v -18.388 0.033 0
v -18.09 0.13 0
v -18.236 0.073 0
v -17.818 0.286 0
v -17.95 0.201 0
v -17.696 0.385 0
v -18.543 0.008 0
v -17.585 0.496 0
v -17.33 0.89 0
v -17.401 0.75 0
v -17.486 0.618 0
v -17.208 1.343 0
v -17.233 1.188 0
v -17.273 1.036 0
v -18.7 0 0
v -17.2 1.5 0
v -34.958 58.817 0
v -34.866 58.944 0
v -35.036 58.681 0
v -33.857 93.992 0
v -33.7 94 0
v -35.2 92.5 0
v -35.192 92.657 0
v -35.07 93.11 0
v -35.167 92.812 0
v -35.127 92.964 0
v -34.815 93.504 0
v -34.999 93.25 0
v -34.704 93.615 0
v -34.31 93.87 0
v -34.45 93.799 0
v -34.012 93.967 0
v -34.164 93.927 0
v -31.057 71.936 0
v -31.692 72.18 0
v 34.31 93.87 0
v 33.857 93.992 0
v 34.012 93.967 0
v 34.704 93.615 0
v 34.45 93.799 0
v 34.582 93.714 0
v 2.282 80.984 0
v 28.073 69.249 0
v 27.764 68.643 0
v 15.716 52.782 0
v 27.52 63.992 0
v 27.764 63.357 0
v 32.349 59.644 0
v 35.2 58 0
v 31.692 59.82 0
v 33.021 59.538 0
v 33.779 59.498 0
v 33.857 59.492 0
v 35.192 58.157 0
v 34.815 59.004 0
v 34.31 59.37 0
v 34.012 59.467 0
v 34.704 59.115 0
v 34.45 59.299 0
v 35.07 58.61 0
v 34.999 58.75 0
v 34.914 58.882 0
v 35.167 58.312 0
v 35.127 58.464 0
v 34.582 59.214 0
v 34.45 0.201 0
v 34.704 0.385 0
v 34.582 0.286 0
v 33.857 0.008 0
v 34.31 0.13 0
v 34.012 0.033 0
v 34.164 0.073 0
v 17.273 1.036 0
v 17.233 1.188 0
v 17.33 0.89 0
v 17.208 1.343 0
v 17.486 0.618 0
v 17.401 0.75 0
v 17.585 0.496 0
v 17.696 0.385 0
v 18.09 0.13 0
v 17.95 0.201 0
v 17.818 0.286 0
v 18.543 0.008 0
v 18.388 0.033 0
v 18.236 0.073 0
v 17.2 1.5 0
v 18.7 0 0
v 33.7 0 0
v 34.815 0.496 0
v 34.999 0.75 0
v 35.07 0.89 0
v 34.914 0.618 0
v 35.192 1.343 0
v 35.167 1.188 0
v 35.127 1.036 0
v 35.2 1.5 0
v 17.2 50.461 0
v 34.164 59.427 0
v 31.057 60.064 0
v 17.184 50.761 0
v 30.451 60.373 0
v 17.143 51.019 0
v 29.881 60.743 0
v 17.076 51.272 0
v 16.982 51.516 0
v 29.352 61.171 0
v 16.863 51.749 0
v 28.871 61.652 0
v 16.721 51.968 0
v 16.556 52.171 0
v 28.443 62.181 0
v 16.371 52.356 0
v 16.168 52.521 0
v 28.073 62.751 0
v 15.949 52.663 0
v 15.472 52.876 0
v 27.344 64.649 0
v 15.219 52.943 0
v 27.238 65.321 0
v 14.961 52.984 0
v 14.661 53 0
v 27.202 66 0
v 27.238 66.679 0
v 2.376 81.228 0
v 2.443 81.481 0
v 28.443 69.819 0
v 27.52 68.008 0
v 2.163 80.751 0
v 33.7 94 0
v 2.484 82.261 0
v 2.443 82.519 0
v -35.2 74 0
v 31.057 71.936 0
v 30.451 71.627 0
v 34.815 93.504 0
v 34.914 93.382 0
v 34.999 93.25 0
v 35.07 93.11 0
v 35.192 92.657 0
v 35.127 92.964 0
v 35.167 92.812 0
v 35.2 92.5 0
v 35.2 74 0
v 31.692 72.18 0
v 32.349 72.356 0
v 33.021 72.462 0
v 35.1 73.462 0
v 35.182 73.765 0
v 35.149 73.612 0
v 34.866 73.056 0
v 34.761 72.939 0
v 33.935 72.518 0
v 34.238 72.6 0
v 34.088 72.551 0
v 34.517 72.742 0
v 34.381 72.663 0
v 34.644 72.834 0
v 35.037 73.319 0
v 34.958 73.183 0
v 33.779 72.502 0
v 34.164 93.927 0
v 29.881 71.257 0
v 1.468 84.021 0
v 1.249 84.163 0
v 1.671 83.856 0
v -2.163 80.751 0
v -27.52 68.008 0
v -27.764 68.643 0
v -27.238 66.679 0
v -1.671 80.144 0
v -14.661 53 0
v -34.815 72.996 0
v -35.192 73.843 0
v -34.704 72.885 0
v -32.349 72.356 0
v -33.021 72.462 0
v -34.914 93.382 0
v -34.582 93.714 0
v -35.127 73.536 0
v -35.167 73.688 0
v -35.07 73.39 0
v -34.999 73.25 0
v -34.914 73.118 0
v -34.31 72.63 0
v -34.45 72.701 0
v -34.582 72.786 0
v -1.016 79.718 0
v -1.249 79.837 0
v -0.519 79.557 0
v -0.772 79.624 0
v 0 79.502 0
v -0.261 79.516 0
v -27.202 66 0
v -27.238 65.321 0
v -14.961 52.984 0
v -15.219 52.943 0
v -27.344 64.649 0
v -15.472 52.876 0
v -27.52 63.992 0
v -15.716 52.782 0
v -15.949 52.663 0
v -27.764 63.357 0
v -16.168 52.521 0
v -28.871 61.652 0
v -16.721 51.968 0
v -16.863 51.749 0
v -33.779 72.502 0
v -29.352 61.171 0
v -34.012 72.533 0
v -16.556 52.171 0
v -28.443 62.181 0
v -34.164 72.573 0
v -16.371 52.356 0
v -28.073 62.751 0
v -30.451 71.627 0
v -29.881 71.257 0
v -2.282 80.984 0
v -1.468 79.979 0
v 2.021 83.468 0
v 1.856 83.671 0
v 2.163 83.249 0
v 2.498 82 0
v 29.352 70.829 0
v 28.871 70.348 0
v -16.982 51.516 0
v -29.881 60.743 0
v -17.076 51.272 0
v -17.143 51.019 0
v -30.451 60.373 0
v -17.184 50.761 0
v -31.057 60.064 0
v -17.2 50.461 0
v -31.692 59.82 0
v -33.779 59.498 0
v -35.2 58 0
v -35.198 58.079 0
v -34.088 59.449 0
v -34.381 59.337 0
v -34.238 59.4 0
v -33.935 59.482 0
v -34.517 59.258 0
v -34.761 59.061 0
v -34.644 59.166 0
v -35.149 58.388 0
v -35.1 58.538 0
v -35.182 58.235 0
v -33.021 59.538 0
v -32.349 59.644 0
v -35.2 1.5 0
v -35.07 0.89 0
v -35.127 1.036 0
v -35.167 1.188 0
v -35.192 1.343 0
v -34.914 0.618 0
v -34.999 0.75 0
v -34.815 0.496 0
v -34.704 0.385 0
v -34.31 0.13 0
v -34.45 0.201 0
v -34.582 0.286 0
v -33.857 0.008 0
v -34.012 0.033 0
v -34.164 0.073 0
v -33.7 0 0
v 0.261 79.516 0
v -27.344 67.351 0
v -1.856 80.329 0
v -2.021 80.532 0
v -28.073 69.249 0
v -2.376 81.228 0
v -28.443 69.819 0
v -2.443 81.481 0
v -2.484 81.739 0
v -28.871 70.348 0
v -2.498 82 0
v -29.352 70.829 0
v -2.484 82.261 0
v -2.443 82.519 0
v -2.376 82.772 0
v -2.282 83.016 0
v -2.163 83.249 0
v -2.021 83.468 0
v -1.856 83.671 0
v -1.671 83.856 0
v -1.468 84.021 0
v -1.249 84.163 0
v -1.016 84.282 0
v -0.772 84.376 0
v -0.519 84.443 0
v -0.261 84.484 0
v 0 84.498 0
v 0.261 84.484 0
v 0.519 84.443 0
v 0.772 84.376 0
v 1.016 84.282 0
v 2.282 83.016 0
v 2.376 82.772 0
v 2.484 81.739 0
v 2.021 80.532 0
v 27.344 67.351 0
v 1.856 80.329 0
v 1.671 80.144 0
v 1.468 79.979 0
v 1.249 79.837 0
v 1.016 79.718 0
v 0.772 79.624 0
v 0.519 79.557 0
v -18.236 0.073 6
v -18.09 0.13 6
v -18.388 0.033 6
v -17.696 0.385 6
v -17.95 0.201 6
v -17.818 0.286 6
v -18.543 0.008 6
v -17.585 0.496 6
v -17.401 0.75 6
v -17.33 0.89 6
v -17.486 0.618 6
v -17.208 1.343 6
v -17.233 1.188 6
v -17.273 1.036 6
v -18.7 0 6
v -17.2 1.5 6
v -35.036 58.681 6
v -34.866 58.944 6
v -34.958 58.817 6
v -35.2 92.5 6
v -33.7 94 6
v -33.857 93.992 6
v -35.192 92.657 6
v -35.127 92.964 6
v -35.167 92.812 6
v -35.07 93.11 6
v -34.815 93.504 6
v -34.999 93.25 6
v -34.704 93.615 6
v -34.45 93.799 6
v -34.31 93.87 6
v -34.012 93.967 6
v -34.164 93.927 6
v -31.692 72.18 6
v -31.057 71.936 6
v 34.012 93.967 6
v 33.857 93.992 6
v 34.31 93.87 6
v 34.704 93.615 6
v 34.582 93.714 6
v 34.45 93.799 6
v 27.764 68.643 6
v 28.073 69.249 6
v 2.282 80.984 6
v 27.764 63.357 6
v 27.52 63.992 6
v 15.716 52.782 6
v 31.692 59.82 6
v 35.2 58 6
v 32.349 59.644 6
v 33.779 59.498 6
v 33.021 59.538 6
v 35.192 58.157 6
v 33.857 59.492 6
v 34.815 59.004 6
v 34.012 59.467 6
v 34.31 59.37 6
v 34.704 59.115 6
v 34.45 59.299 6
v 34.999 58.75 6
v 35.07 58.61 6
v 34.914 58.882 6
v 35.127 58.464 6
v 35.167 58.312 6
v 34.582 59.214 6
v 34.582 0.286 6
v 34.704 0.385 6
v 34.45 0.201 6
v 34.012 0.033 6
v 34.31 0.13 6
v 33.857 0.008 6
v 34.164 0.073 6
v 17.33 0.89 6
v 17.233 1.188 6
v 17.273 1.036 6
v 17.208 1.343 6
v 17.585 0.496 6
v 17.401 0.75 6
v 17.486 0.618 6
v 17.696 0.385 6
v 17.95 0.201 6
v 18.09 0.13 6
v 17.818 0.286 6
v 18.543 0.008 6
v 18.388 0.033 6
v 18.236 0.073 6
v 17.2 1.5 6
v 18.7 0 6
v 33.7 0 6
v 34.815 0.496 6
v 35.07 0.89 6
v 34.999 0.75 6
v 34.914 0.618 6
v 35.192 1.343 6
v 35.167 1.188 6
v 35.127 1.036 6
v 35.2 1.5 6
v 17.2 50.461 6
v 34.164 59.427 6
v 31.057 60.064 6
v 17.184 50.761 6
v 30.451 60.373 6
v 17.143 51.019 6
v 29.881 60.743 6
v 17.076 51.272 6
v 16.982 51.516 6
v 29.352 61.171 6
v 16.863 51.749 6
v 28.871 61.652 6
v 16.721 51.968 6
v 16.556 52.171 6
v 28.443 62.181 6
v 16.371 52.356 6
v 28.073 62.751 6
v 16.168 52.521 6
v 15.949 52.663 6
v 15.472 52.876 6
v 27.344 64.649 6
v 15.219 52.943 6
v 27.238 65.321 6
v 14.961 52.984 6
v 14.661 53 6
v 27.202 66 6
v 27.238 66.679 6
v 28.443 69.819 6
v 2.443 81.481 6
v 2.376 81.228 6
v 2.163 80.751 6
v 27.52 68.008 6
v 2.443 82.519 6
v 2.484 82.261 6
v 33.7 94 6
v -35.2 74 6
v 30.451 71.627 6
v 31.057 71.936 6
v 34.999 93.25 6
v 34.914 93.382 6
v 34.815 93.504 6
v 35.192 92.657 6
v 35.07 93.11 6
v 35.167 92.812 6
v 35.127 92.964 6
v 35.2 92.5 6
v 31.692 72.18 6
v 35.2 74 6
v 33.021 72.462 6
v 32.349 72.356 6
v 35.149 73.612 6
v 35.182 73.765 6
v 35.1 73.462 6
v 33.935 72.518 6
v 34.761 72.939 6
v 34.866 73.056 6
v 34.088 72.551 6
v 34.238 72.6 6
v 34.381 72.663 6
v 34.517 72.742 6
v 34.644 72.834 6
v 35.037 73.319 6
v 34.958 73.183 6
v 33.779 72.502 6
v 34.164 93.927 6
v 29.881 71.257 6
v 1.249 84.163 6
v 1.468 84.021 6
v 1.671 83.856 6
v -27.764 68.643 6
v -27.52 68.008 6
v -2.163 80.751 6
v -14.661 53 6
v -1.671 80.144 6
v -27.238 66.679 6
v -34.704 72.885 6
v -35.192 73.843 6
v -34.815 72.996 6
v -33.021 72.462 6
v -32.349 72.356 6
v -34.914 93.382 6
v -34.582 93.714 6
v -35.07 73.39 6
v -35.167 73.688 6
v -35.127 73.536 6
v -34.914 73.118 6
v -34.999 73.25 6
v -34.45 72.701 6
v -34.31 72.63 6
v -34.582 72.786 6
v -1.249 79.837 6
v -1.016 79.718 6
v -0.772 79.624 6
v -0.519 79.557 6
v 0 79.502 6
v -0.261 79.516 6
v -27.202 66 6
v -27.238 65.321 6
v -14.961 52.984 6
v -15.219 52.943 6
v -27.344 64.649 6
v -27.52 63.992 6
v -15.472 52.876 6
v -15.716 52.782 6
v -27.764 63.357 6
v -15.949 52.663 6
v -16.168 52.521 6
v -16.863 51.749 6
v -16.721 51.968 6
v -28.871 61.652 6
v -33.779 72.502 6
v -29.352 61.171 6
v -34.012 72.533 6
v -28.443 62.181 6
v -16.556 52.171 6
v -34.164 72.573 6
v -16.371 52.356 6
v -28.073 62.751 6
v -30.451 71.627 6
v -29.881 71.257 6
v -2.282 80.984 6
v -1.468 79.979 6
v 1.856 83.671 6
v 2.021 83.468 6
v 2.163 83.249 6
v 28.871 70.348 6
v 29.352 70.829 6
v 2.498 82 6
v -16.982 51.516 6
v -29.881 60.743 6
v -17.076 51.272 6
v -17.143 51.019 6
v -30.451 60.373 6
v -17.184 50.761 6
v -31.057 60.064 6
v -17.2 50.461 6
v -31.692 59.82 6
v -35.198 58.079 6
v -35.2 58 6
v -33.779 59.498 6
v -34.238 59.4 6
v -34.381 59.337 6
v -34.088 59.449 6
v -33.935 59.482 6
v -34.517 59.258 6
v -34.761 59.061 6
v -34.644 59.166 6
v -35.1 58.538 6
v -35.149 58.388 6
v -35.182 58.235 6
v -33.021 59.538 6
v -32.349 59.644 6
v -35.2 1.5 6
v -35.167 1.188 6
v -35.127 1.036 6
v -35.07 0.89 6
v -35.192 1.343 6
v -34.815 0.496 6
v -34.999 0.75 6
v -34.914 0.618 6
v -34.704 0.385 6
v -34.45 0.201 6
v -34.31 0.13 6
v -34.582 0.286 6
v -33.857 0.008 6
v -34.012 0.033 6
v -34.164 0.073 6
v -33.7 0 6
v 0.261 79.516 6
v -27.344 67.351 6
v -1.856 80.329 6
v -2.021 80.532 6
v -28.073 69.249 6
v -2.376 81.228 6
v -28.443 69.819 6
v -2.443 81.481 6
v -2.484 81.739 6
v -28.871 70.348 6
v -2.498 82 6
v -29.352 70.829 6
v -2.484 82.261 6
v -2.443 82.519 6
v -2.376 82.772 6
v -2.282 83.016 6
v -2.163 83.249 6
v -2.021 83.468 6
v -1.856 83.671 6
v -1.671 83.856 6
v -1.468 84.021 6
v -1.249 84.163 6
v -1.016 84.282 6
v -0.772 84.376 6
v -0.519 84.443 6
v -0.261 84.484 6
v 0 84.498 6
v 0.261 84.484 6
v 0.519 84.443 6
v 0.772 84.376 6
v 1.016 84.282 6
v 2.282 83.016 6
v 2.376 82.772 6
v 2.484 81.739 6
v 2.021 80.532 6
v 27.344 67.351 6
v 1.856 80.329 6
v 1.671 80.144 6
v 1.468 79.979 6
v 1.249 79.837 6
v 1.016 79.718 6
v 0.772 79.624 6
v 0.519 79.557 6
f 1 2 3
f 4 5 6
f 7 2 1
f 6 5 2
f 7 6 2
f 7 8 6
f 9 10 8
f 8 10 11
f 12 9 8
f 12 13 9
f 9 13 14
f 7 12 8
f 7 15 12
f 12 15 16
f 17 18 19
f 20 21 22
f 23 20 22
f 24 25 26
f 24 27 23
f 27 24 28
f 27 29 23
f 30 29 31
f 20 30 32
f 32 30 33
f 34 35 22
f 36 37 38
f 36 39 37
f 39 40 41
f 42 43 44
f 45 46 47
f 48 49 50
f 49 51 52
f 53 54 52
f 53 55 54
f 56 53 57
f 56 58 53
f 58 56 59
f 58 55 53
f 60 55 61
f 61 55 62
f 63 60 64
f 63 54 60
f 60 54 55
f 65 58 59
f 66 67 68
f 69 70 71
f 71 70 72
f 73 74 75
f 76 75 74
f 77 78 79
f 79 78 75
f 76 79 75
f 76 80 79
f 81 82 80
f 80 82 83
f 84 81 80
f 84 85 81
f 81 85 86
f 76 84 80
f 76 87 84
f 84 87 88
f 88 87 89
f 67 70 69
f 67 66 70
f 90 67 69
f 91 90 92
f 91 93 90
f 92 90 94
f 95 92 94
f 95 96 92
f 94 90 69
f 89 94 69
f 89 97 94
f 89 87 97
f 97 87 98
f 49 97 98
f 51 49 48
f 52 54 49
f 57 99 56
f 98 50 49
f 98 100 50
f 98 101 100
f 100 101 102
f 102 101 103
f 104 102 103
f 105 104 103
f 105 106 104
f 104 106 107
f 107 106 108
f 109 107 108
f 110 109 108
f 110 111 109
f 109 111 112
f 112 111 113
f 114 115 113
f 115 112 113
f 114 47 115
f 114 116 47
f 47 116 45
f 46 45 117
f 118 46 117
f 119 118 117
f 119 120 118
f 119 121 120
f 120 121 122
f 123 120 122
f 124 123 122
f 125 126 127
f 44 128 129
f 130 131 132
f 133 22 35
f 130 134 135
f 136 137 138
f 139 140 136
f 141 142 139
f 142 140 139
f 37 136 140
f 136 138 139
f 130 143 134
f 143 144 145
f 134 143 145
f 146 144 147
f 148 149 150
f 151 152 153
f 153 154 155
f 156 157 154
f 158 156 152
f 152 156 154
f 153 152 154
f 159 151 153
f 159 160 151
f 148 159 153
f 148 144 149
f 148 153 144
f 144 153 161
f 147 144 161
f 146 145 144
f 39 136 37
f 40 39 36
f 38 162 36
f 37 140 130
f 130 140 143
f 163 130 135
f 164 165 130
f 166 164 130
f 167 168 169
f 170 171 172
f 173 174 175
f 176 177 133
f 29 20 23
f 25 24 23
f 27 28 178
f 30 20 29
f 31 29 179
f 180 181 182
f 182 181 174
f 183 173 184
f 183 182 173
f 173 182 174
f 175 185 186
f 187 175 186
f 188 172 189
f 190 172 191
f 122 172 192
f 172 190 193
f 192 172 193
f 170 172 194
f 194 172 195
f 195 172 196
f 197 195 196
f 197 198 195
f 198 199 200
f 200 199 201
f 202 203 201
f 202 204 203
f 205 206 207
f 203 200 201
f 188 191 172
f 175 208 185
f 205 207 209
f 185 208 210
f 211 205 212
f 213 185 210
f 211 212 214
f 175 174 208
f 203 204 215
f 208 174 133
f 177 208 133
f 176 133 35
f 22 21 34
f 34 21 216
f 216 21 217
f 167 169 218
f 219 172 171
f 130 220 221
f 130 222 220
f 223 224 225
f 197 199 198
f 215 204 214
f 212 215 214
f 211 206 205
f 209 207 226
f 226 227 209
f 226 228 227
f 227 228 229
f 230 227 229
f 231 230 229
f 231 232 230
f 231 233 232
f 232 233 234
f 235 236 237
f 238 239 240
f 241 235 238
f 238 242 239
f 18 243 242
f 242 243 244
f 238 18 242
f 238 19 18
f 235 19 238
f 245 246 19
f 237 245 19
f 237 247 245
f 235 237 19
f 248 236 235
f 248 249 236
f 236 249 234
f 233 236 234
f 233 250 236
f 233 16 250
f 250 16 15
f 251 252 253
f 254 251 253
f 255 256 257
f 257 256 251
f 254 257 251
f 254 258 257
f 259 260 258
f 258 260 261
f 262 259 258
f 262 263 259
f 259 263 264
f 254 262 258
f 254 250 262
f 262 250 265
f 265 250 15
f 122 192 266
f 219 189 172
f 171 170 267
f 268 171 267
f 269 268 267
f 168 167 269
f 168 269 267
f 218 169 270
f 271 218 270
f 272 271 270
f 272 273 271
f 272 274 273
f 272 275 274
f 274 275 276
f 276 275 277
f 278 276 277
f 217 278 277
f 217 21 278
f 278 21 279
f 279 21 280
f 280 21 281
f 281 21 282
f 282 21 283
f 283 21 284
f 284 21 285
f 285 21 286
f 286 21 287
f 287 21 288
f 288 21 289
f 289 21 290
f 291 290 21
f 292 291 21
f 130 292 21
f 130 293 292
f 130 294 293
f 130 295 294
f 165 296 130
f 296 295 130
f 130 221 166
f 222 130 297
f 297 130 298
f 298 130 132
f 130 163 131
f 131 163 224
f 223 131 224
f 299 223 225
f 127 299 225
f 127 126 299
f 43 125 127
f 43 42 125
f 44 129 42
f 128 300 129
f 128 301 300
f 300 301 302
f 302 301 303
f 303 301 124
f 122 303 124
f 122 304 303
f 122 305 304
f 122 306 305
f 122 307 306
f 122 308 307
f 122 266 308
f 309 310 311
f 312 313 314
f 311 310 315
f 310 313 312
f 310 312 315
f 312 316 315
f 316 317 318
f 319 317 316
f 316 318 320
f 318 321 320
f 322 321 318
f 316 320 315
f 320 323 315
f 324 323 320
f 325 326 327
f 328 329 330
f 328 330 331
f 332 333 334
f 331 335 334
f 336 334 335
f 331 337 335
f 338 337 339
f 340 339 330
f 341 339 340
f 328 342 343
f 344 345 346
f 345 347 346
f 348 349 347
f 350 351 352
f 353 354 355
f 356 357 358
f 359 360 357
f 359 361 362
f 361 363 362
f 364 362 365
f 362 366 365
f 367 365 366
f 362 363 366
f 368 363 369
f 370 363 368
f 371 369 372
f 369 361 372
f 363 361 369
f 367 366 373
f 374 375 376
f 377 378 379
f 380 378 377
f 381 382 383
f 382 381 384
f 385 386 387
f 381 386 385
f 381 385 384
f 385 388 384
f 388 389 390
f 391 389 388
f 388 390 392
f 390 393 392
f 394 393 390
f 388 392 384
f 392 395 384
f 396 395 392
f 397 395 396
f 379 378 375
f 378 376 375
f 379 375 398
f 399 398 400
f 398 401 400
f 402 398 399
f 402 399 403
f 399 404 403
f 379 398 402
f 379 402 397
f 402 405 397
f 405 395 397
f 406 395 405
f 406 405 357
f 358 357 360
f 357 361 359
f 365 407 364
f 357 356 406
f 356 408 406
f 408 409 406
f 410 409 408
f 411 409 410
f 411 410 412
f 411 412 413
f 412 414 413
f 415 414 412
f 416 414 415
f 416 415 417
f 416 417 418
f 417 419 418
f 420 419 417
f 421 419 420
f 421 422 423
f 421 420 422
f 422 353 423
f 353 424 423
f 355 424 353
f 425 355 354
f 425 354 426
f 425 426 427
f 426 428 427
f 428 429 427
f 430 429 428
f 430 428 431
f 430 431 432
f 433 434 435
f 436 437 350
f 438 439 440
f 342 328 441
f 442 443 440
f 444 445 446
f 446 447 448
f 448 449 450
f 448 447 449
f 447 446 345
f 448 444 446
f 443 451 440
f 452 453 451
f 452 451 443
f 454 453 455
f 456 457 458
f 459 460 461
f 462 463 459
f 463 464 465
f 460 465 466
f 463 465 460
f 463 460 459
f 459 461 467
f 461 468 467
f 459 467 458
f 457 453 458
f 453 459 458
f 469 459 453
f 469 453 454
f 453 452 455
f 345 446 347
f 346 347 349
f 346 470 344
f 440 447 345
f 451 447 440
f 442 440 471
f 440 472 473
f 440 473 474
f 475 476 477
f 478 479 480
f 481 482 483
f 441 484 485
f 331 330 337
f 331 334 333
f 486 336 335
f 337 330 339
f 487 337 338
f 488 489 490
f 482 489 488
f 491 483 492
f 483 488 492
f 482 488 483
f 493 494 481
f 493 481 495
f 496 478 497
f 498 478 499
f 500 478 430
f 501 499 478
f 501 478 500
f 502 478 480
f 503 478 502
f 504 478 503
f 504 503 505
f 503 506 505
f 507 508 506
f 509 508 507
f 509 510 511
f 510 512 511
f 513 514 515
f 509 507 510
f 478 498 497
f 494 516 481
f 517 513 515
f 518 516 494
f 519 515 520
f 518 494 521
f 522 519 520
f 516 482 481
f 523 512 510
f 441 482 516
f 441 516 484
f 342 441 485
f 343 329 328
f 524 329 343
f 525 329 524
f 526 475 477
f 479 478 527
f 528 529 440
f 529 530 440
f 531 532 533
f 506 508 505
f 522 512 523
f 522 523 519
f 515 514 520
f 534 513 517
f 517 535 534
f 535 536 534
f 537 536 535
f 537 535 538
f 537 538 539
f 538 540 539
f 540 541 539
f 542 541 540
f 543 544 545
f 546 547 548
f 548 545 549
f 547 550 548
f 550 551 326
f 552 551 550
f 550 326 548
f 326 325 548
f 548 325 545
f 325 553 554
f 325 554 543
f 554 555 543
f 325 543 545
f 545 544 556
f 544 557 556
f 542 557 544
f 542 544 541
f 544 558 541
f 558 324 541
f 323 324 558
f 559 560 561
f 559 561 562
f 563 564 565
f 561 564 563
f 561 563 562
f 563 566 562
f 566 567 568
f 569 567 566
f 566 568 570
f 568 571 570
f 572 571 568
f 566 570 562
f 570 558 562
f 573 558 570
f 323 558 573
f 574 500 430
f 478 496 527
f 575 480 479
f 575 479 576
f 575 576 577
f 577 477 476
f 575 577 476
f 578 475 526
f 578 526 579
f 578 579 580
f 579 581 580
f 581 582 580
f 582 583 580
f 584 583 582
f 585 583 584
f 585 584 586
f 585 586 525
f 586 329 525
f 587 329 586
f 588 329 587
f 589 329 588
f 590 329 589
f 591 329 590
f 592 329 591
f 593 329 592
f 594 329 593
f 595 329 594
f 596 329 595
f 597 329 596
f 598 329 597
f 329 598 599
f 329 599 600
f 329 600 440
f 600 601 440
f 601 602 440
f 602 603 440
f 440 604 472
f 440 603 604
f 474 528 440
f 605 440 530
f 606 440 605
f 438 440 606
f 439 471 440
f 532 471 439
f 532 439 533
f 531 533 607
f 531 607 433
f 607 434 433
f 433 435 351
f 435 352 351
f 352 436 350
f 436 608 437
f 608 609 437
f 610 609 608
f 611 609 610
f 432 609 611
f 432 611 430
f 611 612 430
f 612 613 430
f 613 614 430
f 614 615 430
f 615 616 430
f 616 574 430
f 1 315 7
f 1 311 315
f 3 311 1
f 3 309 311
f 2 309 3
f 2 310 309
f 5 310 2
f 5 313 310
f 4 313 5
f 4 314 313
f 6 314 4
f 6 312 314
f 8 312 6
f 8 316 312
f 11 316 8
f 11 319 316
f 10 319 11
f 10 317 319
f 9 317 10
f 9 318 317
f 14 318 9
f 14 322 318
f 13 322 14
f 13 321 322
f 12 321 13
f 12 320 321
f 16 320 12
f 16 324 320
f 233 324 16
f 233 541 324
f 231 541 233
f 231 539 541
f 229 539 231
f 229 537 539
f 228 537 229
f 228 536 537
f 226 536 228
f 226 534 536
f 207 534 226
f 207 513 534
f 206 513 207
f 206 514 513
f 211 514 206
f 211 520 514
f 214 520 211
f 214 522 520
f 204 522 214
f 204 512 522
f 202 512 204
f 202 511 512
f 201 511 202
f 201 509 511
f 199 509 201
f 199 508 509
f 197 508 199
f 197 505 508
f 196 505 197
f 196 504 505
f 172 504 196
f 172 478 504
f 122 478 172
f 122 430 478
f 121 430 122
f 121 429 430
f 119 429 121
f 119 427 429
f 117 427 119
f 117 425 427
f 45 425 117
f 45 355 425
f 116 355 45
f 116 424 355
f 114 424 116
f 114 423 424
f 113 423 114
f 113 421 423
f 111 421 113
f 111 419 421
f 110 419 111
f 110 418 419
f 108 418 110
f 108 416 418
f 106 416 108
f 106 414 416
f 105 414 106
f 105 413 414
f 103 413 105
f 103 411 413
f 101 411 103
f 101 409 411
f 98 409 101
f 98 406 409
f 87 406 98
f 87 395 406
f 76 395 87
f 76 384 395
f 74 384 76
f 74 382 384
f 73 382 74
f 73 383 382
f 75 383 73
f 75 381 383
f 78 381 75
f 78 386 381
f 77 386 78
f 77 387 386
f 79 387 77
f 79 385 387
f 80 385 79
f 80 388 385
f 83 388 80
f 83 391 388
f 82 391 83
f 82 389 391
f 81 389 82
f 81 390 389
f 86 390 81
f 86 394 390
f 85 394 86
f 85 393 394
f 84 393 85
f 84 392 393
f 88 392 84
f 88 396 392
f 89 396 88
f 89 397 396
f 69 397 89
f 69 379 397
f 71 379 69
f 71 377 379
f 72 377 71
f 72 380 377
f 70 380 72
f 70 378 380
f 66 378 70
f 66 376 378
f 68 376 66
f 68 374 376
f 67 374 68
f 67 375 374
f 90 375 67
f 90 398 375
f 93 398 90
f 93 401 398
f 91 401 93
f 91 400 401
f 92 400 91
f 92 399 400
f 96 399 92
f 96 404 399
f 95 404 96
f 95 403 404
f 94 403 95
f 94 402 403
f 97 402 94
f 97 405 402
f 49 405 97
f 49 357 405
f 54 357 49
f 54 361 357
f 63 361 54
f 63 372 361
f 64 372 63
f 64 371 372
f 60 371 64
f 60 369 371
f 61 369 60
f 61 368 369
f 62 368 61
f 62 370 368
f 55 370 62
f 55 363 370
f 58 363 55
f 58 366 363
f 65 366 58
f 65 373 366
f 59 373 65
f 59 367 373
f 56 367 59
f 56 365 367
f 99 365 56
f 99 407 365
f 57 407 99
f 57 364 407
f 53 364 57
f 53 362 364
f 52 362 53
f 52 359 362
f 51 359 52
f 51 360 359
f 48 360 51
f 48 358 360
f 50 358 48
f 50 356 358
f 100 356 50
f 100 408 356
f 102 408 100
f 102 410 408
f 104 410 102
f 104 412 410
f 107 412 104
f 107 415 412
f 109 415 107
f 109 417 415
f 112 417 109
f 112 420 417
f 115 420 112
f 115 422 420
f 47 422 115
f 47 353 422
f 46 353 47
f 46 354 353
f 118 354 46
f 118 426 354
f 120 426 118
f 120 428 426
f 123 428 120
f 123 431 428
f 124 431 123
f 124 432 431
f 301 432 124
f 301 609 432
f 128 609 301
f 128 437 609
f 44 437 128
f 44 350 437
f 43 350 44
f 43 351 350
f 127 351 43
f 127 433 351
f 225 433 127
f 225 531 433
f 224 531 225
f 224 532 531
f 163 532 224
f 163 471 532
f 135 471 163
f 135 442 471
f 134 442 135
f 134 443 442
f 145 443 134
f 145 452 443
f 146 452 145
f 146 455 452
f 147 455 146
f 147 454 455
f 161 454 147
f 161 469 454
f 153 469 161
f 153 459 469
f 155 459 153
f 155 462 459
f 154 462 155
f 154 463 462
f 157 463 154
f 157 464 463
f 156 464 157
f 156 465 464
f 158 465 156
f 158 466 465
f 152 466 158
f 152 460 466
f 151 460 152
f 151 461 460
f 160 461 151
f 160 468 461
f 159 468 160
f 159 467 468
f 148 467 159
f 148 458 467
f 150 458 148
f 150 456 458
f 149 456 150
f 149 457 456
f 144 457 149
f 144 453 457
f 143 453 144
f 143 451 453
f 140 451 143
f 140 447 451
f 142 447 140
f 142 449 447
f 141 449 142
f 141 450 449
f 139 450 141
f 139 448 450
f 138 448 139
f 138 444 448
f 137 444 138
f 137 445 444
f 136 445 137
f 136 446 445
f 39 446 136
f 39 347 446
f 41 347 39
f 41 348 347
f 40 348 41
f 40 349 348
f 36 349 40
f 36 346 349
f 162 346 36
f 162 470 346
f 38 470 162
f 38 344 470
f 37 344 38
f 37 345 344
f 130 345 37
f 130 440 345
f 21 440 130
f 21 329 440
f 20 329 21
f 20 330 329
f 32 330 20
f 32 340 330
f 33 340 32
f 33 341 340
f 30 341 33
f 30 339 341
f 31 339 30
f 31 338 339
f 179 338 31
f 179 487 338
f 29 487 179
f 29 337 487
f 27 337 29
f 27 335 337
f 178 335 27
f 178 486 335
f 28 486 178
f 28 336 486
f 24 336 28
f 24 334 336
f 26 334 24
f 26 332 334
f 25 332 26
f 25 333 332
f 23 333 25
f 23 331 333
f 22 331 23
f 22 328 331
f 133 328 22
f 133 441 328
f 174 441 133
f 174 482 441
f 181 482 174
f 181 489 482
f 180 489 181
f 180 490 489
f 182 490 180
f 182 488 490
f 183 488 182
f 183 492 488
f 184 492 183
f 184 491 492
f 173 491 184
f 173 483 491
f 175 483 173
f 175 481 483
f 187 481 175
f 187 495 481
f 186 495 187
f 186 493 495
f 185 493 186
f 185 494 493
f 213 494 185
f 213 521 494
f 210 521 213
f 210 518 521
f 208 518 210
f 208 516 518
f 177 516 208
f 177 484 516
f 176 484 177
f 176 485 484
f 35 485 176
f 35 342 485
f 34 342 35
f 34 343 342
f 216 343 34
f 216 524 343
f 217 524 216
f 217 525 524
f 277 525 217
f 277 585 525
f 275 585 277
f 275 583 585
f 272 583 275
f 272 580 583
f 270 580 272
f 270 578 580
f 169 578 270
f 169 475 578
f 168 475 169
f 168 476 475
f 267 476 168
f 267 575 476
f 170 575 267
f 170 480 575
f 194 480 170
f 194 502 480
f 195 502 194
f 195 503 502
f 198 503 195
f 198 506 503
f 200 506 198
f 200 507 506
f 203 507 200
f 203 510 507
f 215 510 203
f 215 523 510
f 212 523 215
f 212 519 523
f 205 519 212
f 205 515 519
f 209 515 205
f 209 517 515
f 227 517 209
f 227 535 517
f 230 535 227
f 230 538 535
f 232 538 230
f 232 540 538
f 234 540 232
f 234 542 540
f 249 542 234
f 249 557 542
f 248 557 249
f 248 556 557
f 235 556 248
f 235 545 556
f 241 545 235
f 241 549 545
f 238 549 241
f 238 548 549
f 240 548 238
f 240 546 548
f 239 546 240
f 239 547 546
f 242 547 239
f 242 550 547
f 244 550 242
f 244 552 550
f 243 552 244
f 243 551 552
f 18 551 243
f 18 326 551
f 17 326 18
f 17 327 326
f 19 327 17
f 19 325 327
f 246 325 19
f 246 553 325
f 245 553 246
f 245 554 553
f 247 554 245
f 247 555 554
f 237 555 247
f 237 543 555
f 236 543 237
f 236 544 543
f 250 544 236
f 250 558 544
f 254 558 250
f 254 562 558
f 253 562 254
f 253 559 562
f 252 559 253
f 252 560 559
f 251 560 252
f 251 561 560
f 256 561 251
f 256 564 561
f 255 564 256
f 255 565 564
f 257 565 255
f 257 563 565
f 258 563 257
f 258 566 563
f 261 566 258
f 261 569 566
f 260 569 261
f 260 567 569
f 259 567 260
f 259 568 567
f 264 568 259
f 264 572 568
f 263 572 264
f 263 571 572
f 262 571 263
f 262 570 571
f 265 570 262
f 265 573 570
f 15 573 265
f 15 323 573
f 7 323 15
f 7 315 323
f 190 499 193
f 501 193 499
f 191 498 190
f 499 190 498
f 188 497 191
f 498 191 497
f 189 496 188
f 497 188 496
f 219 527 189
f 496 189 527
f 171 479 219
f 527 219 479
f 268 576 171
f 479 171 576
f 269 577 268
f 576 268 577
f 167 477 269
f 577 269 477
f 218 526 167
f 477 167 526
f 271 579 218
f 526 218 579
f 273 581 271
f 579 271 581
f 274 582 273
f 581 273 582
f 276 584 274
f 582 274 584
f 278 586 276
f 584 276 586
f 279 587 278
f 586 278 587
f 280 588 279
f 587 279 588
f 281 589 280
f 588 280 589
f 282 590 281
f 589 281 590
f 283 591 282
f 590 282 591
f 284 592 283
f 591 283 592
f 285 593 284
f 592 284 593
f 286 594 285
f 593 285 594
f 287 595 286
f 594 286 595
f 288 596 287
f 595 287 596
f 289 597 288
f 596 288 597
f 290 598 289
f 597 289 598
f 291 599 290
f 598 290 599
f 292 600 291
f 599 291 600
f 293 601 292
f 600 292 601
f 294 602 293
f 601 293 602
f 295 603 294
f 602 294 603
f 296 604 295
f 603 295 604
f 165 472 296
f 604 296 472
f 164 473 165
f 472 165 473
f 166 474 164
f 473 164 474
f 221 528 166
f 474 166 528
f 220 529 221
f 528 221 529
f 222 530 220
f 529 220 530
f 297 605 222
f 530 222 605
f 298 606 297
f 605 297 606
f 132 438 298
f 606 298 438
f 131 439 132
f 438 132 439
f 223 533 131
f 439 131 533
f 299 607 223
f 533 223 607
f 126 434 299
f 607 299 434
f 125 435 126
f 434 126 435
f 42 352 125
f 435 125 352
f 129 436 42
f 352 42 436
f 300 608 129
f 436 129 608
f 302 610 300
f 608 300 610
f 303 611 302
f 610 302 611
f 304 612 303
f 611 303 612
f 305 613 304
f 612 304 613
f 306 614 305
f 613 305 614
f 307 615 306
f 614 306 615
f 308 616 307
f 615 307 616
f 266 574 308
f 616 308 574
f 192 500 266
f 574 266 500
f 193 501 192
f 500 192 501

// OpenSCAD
// --- Adjustable Parameters ---
opening_width = 34.4;   // 1-3/8" gap
prong_width = 18.0;     // Width of the "legs"
prong_length = 52.0;    // Depth of the prongs
handle_height = 42.0;   // Height of handle area
plate_thickness = 6.0;  // Total thickness
edge_radius = 1.5;      // Horizontal rounding (corners)
throat_radius = 4.0;    // The "slight radius" in the corners of the throat

// Increase this for the final render (F6), keep it low (20-30) for preview
$fn = 60; 

// --- The Tool Logic ---
linear_extrude(height = plate_thickness) {
    offset(r = edge_radius) { // This rounds all horizontal edges instantly
        difference() {
            // 1. MAIN BODY (Shrunk slightly to account for the offset)
            total_w = opening_width + (prong_width * 2);
            total_h = prong_length + handle_height;
            
            translate([-(total_w/2 - edge_radius), edge_radius])
                square([total_w - edge_radius*2, total_h - edge_radius*2]);

            // 2. THE SQUARED THROAT (Matches the product photo)
            // We create the flat-top cutout with small radius corners
            translate([0, prong_length - edge_radius])
                hull() {
                    translate([-(opening_width/2 + edge_radius - throat_radius), 0]) 
                        circle(r = throat_radius);
                    translate([(opening_width/2 + edge_radius - throat_radius), 0]) 
                        circle(r = throat_radius);
                }
            
            // Clean out the rest of the prong gap
            translate([-(opening_width/2 + edge_radius), -5])
                square([opening_width + edge_radius*2, prong_length - edge_radius + 5]);

            // 3. FINGER GRIPS (Side Cutouts)
            translate([-total_w/2 + edge_radius, total_h - 28]) 
                circle(r = 8);
            translate([total_w/2 - edge_radius, total_h - 28]) 
                circle(r = 8);

            // 4. TOP HOLE
            translate([0, total_h - 12]) 
                circle(d = 8);

            // 5. OUTER TIP TAPERS
            // Left Tip
            translate([-total_w/2, 0])
                rotate([0, 0, 15]) translate([-20, 0]) square([20, 30]);
            // Right Tip
            translate([total_w/2, 0])
                rotate([0, 0, -15]) translate([0, 0]) square([20, 30]);
        }
    }
}   
